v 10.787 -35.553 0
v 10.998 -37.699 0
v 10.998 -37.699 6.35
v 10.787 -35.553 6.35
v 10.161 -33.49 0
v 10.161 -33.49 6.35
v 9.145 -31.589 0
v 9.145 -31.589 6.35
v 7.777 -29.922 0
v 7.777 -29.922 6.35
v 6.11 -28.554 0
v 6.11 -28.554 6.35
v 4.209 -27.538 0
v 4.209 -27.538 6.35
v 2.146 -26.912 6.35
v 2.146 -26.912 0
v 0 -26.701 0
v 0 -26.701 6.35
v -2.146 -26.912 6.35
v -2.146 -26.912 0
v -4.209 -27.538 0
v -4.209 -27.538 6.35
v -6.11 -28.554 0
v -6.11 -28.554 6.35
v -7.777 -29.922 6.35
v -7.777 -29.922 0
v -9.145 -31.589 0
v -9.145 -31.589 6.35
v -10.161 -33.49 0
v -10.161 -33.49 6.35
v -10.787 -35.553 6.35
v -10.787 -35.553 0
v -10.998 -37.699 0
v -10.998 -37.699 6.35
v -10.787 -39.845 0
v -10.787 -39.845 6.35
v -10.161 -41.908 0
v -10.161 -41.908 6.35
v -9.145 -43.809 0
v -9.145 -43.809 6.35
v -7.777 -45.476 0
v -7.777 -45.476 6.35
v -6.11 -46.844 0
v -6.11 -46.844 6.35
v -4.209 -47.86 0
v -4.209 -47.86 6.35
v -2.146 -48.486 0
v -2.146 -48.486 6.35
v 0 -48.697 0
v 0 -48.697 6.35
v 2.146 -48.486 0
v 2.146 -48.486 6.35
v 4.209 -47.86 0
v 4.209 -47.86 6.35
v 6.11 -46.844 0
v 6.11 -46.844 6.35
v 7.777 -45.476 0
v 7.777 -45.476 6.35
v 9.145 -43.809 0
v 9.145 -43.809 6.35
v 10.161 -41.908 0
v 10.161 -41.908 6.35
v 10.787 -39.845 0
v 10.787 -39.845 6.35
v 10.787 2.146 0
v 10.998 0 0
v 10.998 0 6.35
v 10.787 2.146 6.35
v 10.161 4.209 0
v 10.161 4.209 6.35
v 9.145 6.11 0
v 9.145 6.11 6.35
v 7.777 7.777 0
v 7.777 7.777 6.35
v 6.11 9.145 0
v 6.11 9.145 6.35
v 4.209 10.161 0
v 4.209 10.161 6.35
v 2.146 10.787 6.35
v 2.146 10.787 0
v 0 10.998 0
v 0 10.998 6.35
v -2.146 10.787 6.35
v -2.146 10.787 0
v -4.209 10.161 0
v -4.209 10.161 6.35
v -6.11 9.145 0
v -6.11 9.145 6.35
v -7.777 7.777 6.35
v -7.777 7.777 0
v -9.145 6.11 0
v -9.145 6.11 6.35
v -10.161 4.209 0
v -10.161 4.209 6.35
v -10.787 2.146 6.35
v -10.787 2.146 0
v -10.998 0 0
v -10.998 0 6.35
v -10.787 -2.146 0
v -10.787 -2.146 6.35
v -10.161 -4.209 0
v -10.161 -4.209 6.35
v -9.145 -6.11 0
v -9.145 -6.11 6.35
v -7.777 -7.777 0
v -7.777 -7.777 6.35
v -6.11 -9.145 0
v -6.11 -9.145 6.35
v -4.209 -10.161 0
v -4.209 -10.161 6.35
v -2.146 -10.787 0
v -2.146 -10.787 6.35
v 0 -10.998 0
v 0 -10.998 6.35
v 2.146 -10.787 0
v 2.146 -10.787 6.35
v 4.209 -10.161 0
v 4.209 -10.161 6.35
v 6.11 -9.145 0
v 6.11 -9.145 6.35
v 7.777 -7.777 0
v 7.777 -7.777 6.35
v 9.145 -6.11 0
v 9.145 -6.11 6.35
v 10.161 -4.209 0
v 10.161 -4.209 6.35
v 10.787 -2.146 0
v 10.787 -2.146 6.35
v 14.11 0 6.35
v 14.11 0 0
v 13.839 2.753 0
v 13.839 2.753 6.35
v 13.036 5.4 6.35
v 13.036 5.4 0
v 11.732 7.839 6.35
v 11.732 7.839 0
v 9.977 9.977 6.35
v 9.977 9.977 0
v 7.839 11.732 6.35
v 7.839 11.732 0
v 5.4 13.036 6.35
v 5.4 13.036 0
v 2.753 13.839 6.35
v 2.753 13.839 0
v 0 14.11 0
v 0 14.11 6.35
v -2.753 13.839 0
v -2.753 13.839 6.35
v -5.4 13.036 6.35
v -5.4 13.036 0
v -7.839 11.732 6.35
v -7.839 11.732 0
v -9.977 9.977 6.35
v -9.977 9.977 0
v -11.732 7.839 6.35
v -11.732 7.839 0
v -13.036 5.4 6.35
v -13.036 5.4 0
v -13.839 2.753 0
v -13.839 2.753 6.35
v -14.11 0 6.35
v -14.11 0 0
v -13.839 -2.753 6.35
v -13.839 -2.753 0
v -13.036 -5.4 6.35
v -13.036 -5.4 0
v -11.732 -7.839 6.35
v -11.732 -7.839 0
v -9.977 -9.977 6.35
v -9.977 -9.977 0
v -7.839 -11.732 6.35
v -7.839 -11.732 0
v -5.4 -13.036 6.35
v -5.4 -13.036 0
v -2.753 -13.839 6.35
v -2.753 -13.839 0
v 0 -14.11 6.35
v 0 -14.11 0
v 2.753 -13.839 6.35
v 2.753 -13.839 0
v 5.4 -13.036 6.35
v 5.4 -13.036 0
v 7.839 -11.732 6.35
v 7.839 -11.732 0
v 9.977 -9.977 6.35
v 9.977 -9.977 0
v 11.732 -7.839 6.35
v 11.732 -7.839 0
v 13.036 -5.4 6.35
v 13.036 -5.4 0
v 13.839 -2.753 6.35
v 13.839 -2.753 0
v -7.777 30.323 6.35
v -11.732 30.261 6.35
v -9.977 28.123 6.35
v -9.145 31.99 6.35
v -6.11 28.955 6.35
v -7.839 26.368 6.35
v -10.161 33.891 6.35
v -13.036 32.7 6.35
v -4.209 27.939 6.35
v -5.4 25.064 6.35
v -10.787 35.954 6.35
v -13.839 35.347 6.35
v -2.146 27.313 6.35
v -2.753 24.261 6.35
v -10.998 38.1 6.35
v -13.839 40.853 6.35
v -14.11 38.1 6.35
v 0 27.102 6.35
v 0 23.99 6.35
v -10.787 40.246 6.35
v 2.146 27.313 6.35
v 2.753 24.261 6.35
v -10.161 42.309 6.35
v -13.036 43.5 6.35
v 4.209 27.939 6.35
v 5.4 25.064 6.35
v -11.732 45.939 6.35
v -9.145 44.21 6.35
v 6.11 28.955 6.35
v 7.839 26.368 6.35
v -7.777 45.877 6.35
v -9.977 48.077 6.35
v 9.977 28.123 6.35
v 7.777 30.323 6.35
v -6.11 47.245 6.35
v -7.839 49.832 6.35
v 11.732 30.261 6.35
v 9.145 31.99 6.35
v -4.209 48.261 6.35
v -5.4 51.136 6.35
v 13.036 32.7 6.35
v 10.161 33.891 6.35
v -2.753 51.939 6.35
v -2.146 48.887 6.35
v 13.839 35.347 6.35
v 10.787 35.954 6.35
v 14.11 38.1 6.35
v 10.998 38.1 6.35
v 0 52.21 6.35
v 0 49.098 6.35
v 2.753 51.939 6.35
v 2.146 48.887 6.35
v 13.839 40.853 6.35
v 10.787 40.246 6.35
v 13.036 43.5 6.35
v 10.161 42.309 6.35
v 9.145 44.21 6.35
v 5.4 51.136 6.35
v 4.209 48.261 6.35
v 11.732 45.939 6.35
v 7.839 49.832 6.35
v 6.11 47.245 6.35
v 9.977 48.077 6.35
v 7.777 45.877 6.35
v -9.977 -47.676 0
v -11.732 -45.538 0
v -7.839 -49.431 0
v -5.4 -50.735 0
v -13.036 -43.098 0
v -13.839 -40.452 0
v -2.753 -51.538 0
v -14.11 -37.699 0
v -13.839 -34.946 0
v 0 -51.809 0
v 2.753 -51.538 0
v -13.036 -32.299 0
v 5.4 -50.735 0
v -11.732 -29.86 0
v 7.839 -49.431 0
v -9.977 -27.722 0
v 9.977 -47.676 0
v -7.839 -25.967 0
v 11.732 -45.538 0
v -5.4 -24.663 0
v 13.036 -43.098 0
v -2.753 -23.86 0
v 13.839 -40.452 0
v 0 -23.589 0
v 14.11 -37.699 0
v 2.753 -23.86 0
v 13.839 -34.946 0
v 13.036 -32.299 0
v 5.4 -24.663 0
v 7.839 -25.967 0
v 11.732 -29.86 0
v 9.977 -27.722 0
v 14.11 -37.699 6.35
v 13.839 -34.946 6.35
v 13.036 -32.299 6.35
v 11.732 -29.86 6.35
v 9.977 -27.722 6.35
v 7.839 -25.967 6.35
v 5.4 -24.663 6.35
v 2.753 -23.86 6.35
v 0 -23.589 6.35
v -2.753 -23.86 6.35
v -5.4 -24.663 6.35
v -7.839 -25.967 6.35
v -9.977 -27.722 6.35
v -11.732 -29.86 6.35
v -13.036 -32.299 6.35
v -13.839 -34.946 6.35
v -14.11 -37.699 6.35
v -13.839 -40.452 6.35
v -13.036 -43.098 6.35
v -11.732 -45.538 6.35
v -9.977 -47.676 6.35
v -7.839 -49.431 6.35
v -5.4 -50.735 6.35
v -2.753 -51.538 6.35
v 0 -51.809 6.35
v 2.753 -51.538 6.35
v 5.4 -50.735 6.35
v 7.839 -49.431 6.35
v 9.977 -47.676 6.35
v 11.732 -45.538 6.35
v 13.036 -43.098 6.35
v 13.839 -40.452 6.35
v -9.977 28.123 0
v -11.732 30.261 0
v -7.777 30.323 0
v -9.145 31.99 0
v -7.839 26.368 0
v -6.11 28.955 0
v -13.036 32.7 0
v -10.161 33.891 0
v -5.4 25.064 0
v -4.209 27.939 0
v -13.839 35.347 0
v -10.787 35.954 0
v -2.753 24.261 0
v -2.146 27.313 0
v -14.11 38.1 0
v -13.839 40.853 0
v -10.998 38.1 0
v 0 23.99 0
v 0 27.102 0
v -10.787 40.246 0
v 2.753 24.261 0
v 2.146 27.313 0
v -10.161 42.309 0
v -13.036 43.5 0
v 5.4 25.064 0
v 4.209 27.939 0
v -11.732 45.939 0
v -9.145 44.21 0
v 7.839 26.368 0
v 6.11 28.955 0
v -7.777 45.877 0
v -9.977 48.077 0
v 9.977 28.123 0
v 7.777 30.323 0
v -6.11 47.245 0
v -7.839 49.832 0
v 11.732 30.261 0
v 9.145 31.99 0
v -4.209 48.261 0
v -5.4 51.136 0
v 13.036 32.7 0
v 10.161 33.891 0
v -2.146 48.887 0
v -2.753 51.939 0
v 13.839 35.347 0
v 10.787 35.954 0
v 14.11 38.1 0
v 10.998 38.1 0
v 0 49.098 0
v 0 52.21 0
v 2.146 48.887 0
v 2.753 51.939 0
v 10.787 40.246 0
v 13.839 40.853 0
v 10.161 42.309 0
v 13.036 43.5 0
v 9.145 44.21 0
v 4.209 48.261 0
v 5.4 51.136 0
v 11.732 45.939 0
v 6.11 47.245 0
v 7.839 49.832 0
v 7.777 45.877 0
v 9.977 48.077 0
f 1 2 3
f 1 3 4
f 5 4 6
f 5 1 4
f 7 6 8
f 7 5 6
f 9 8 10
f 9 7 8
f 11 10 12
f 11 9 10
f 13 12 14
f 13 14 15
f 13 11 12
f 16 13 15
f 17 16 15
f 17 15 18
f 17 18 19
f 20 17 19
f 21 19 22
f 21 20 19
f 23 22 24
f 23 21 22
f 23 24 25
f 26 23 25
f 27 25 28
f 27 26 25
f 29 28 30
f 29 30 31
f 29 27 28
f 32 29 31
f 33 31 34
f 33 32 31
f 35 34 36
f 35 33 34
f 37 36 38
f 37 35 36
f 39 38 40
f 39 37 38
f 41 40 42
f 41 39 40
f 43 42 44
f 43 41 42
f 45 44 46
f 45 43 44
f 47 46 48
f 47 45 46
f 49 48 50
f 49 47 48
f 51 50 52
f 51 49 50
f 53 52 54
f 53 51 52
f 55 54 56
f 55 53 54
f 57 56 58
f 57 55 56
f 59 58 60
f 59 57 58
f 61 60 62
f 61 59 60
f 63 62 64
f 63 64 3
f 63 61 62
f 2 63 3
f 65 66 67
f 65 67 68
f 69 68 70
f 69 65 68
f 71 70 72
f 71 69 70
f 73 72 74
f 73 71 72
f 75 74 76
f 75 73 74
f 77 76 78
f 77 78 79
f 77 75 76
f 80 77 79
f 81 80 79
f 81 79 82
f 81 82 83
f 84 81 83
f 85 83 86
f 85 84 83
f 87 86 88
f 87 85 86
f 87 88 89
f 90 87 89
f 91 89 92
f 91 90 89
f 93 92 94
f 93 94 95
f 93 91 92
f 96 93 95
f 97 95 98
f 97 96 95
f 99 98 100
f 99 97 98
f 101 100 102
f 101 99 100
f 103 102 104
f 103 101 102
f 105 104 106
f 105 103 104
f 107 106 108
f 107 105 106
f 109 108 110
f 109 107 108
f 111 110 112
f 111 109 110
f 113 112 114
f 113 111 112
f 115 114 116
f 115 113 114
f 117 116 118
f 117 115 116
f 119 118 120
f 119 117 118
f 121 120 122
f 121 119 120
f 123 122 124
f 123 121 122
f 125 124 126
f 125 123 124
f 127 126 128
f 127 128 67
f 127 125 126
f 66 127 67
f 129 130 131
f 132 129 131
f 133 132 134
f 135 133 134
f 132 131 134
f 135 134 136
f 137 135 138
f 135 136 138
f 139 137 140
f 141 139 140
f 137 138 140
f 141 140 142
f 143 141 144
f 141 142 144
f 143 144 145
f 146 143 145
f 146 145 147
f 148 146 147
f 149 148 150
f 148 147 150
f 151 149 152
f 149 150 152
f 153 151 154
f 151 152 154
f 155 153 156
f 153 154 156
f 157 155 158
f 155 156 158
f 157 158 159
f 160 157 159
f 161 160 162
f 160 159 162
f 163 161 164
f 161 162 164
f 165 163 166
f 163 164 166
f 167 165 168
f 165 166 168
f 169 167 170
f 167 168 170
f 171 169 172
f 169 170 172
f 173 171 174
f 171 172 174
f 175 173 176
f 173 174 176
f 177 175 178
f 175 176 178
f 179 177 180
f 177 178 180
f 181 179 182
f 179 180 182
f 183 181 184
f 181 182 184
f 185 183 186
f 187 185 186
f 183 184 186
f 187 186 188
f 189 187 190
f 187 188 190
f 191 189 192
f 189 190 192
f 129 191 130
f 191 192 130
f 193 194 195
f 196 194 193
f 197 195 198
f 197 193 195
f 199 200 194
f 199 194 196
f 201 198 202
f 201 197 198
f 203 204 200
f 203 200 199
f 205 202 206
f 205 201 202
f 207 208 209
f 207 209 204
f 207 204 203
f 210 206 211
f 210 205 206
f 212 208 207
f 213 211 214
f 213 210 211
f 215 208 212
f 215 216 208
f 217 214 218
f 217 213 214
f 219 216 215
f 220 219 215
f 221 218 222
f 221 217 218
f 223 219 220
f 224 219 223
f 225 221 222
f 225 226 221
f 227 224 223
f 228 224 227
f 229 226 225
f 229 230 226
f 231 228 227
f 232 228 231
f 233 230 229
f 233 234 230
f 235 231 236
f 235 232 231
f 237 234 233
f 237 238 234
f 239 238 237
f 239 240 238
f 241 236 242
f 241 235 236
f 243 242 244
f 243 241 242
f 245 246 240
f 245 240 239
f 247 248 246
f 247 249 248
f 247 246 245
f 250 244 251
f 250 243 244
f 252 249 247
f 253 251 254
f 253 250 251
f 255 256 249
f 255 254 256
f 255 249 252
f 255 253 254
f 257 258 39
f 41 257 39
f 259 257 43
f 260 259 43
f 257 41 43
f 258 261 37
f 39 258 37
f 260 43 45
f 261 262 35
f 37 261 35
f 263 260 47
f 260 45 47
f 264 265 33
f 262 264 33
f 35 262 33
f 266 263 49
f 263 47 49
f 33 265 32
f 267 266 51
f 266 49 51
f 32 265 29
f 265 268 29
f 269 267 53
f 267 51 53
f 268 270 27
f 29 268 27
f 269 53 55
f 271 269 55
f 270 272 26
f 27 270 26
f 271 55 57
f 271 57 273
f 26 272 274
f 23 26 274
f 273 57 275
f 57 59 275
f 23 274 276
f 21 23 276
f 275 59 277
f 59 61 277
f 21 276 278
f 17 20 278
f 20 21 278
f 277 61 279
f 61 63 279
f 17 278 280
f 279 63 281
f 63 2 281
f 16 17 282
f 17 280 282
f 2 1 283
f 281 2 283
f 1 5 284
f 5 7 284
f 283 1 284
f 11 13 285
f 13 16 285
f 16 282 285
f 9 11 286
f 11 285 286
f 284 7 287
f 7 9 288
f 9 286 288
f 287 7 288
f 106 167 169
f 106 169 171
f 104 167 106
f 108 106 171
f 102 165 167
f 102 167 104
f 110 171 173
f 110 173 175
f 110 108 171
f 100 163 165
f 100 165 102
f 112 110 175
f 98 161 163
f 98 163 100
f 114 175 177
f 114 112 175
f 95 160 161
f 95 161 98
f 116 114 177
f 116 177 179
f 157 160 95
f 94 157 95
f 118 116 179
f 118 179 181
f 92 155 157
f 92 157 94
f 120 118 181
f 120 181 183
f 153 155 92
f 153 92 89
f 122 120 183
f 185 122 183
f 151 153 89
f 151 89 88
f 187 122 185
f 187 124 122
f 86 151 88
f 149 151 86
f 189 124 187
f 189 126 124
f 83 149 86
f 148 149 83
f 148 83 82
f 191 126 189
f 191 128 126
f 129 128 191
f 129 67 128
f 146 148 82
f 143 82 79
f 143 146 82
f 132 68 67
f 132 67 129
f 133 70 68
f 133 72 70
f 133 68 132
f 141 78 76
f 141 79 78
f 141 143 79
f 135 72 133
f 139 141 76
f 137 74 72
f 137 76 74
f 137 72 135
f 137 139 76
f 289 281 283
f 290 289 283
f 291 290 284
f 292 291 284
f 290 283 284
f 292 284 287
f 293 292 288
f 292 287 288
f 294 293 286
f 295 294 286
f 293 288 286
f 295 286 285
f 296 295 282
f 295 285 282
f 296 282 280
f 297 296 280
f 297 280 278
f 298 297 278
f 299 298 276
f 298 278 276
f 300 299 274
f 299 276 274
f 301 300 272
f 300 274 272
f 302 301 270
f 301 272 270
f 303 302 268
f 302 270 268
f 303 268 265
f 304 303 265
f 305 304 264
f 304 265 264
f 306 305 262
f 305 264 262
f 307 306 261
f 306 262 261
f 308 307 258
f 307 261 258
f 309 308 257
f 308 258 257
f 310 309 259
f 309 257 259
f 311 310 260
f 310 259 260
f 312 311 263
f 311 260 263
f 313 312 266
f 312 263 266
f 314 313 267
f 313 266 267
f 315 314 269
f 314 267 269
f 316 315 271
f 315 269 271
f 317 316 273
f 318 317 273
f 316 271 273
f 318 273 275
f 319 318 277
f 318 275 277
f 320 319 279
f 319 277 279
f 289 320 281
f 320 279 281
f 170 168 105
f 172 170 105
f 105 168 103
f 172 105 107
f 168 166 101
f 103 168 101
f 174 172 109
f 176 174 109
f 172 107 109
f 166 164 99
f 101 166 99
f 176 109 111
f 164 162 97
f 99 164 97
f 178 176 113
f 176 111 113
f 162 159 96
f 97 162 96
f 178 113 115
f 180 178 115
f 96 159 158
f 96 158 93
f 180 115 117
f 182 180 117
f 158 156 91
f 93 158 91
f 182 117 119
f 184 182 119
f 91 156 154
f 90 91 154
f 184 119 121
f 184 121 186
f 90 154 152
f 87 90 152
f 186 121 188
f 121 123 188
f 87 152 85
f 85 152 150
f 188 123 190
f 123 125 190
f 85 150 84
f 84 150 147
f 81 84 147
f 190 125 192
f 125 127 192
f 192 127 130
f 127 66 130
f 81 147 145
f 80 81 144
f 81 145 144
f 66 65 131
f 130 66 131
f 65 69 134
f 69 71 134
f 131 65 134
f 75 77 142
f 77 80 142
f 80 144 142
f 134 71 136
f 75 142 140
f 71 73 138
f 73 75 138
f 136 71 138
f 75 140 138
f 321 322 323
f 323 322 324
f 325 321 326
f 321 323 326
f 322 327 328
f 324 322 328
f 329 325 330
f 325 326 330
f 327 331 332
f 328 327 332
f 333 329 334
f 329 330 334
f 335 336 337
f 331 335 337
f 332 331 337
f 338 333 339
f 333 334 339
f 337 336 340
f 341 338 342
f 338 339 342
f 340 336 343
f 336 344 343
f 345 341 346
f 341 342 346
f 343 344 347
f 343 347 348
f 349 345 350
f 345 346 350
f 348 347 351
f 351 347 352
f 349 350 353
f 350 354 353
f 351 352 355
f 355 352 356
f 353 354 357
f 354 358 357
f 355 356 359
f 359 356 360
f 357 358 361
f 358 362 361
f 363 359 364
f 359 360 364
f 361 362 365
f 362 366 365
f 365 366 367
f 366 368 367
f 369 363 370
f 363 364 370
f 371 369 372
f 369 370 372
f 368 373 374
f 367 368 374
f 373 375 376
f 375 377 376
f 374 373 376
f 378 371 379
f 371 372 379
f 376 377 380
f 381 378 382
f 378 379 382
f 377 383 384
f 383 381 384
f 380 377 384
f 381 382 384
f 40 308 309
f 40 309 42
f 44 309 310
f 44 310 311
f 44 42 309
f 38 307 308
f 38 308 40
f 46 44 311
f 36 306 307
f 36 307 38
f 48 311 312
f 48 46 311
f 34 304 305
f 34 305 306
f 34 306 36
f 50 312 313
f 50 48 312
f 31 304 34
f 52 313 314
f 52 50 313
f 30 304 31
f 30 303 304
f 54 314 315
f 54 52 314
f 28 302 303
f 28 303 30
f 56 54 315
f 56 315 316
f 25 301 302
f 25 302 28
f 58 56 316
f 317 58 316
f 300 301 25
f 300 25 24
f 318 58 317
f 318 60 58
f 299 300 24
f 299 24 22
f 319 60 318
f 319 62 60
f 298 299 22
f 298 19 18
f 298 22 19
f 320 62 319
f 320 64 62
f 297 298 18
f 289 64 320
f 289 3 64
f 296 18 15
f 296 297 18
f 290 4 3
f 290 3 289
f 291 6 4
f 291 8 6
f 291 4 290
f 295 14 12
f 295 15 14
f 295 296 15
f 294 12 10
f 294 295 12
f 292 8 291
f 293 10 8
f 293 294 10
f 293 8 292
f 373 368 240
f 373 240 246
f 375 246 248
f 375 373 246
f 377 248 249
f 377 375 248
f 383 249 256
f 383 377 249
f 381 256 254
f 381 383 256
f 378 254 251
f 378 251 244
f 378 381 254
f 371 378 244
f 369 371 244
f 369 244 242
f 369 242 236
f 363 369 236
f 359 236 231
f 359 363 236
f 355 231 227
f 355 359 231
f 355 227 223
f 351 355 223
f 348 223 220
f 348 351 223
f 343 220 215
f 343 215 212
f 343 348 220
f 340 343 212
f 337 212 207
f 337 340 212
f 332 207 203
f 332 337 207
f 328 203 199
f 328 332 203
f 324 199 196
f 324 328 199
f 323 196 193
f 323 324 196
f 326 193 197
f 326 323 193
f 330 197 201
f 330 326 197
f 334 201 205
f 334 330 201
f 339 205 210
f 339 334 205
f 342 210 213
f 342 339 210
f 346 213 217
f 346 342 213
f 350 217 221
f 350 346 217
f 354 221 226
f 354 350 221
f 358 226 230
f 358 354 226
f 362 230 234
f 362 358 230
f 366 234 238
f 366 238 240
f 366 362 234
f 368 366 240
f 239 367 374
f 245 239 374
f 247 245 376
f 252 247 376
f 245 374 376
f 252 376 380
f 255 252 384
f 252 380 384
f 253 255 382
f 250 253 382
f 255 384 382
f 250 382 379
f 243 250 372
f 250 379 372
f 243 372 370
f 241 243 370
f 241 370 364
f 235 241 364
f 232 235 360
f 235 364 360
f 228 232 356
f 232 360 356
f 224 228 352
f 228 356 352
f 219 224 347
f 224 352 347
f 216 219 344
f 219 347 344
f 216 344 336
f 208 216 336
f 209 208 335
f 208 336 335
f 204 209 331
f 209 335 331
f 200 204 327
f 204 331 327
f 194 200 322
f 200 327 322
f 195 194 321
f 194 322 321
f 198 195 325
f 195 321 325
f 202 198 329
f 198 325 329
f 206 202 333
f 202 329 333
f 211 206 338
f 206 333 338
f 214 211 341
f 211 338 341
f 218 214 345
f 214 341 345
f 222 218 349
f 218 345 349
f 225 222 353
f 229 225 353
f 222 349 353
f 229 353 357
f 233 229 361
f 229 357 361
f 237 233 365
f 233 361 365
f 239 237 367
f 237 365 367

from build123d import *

# Parameters (mm, degrees)
F0_R     = 14.1097
F0_R_2   = 10.9982
F1_DEPTH = 6.35


with BuildPart() as f1:
    # F0 (on Top) → F1 (new body)
    with BuildSketch(Plane.XY):
        with Locations((0, 38.1)):
            Circle(F0_R)
        with Locations((0, 38.1)):
            Circle(F0_R_2, mode=Mode.SUBTRACT)
        with Locations((0, -37.698947)):
            Circle(F0_R)
        with Locations((0, -37.698947)):
            Circle(F0_R_2, mode=Mode.SUBTRACT)
        Circle(F0_R)
        Circle(F0_R_2, mode=Mode.SUBTRACT)
    extrude(amount=F1_DEPTH)


solid = f1.part
